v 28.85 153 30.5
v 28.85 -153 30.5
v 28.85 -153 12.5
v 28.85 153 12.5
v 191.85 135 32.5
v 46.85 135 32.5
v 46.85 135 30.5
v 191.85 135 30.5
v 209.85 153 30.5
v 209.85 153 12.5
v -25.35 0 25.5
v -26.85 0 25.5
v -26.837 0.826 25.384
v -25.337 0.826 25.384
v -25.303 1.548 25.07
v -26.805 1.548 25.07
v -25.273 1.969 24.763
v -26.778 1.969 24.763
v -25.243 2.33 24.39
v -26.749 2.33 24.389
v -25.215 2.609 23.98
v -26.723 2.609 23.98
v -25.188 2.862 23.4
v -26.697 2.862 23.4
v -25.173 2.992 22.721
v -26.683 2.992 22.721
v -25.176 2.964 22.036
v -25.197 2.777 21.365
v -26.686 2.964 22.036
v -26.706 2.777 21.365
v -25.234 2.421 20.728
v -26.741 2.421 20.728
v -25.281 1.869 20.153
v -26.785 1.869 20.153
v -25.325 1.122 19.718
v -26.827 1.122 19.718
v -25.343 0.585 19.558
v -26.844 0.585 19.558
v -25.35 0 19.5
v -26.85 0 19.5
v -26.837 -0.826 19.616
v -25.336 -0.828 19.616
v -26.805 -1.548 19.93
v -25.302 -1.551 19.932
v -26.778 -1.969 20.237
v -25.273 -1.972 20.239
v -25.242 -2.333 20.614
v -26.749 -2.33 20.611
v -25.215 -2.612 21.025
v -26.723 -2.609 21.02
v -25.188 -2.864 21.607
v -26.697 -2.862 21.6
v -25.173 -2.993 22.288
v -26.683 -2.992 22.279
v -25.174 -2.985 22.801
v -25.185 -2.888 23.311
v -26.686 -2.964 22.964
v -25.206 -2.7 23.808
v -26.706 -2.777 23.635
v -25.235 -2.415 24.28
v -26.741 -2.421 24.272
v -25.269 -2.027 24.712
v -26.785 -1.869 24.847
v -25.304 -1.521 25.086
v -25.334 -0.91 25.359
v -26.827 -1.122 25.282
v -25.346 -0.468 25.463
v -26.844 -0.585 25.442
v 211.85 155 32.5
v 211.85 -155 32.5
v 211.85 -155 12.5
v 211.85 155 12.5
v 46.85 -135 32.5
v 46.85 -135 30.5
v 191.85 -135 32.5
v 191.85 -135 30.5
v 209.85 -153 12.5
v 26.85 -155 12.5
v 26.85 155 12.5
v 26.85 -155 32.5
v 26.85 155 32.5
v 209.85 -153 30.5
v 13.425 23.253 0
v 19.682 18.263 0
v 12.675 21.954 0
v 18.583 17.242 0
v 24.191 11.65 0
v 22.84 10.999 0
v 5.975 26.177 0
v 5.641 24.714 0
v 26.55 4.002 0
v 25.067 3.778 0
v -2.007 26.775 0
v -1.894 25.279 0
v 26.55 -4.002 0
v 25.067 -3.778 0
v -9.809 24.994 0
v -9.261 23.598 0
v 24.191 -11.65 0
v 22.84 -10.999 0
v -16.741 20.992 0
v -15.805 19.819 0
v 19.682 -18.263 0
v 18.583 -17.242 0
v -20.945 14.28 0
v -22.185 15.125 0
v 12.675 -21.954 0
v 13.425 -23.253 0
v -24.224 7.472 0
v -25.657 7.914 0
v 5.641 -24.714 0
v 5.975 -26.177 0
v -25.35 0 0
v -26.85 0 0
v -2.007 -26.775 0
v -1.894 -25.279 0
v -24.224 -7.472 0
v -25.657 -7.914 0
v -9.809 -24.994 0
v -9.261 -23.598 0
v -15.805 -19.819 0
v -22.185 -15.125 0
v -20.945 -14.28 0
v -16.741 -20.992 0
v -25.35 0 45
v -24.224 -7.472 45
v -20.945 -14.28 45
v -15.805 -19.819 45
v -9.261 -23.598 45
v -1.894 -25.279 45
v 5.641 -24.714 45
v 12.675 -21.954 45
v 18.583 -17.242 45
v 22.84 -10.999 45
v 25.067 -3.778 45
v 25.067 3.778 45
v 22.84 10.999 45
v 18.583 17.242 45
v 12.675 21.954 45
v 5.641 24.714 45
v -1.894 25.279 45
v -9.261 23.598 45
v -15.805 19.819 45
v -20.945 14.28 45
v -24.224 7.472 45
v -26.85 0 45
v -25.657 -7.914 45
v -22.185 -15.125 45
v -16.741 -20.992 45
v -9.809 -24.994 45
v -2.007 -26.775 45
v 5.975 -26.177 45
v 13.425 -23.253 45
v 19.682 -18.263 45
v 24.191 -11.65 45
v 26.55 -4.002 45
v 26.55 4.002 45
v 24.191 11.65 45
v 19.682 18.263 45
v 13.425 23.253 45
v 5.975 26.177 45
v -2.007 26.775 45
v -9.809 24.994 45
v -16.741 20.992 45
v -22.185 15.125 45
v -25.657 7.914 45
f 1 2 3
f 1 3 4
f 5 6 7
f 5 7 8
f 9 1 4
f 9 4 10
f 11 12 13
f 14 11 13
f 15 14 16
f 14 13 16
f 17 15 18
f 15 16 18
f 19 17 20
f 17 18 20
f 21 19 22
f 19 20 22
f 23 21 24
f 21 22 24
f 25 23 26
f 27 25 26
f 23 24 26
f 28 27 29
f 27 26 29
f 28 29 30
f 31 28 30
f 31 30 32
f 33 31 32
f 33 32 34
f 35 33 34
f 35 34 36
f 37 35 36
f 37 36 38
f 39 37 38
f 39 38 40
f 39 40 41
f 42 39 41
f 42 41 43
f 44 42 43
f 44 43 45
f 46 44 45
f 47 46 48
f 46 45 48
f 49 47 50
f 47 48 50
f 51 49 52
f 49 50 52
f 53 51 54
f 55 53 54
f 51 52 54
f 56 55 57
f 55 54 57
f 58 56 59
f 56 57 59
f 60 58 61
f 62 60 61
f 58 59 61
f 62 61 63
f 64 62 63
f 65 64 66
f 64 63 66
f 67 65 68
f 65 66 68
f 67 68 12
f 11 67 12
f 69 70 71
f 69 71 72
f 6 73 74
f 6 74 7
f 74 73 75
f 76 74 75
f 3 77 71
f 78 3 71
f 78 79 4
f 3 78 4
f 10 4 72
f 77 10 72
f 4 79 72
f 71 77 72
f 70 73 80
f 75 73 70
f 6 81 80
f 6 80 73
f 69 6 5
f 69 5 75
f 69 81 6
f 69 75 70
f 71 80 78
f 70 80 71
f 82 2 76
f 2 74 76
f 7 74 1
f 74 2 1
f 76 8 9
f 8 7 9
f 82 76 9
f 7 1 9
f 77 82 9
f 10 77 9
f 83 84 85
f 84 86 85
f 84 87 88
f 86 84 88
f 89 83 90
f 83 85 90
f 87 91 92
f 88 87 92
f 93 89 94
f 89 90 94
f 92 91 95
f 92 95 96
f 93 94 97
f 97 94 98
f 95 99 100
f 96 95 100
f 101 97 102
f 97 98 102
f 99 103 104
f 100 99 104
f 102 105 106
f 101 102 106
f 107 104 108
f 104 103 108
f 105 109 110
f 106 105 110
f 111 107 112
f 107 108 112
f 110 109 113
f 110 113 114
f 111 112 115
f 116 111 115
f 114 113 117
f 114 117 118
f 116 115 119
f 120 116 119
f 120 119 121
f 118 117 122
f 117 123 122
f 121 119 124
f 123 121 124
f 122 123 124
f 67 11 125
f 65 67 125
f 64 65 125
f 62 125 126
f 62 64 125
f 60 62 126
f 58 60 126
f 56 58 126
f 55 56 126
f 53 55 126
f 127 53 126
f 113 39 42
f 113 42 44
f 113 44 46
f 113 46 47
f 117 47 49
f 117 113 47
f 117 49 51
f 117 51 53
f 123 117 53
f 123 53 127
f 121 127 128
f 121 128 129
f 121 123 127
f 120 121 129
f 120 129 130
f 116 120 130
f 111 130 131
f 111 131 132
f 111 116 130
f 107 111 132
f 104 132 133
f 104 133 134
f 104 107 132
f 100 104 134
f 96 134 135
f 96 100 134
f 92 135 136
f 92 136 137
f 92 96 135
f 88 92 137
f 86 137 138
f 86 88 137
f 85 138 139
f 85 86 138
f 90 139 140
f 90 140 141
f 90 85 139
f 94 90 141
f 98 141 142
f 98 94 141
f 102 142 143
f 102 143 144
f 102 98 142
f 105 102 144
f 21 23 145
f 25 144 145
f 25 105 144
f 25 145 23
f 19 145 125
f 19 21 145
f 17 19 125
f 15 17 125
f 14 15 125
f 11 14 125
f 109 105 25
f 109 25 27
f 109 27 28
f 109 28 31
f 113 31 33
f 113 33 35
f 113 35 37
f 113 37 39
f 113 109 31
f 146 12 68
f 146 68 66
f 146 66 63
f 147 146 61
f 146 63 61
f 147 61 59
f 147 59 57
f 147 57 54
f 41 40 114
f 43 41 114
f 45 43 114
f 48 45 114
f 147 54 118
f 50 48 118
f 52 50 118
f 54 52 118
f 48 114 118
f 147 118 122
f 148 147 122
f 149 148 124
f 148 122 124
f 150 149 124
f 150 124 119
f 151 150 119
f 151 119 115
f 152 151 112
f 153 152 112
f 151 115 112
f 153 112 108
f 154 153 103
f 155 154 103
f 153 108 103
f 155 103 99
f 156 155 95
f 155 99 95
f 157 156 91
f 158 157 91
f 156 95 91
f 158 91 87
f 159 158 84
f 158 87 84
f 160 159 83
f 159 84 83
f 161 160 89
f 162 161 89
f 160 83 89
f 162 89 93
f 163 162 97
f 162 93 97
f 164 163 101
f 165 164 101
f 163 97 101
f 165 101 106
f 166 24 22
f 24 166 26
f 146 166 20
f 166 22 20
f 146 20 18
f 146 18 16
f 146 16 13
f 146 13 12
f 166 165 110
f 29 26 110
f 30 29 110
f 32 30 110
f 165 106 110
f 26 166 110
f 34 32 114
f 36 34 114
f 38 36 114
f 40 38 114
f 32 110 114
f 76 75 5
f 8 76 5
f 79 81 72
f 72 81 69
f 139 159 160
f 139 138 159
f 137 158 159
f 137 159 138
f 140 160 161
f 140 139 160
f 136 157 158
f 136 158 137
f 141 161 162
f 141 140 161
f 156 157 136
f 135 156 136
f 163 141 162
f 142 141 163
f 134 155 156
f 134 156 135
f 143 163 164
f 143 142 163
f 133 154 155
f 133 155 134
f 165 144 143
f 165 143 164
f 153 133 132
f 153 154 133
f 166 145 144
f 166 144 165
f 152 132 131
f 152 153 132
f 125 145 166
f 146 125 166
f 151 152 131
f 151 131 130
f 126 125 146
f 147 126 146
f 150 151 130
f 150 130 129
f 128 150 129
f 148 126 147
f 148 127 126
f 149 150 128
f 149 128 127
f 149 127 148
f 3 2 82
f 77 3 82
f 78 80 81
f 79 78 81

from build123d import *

# Parameters (mm, degrees)
SKETCH1_R               = 26.85
SKETCH1_R_2             = 25.35
BOSS_EXTRUDE1_DEPTH     = 45
CUT_EXTRUDE2_REACH      = 77.031
CUT_EXTRUDE2_END_RADIUS = 25.35
SKETCH2_R               = 3
SKETCH9_W               = 185
SKETCH9_H               = 310
SKETCH9_W_2             = 145
SKETCH9_H_2             = 270
BOSS_EXTRUDE2_DEPTH     = 10
SHELL3_T                = -2


with BuildPart() as part:
    # Sketch1 → Boss-Extrude1 (new body)
    with BuildSketch(Plane.XY):
        with Locations(Location((0, 0, 0), (0, 0, 180))):
            Circle(SKETCH1_R)
        with Locations(Location((0, 0, 0), (0, 0, 180))):
            Circle(SKETCH1_R_2, mode=Mode.SUBTRACT)
    extrude(amount=BOSS_EXTRUDE1_DEPTH)

    # Cut-Extrude2: up to this cylinder (the profile starts outside it)
    cut_extrude2_end = Plane(origin=(0, 0, 22.5), z_dir=(0, 0, -1)) * Cylinder(CUT_EXTRUDE2_END_RADIUS, 205.762, mode=Mode.PRIVATE)
    # Sketch2 → Cut-Extrude2 (cut, up to the surface)
    with BuildSketch(Plane.ZY.offset(26.85), mode=Mode.PRIVATE) as cut_extrude2_sk1:
        with Locations((22.5, 0)):
            Circle(SKETCH2_R)
    cut_extrude2_tool1 = extrude(cut_extrude2_sk1.sketch, amount=-CUT_EXTRUDE2_REACH, mode=Mode.PRIVATE) - cut_extrude2_end
    add(cut_extrude2_tool1.solids().sort_by_distance((-26.85, 0, 22.5))[0], mode=Mode.SUBTRACT)


with BuildPart() as body_2:
    # Sketch9 → Boss-Extrude2 (new, symmetric)
    with BuildSketch(Plane.XY.offset(22.5)):
        with Locations((119.35, 0)):
            Rectangle(SKETCH9_W, SKETCH9_H)
        with Locations((119.35, 0)):
            Rectangle(SKETCH9_W_2, SKETCH9_H_2, mode=Mode.SUBTRACT)
    extrude(amount=BOSS_EXTRUDE2_DEPTH, both=True)

    # Shell3
    shell3_openings = [body_2.faces().sort_by_distance(p)[0] for p in [
        (119.35, 151.389944599, 12.5),
        (46.85, 0, 22.5),
        (119.35, -135, 22.5),
        (191.85, 0, 22.5),
        (119.35, 135, 22.5),
    ]]
    offset(amount=SHELL3_T, openings=shell3_openings, kind=Kind.INTERSECTION)


solid = Compound([part.part, body_2.part])
